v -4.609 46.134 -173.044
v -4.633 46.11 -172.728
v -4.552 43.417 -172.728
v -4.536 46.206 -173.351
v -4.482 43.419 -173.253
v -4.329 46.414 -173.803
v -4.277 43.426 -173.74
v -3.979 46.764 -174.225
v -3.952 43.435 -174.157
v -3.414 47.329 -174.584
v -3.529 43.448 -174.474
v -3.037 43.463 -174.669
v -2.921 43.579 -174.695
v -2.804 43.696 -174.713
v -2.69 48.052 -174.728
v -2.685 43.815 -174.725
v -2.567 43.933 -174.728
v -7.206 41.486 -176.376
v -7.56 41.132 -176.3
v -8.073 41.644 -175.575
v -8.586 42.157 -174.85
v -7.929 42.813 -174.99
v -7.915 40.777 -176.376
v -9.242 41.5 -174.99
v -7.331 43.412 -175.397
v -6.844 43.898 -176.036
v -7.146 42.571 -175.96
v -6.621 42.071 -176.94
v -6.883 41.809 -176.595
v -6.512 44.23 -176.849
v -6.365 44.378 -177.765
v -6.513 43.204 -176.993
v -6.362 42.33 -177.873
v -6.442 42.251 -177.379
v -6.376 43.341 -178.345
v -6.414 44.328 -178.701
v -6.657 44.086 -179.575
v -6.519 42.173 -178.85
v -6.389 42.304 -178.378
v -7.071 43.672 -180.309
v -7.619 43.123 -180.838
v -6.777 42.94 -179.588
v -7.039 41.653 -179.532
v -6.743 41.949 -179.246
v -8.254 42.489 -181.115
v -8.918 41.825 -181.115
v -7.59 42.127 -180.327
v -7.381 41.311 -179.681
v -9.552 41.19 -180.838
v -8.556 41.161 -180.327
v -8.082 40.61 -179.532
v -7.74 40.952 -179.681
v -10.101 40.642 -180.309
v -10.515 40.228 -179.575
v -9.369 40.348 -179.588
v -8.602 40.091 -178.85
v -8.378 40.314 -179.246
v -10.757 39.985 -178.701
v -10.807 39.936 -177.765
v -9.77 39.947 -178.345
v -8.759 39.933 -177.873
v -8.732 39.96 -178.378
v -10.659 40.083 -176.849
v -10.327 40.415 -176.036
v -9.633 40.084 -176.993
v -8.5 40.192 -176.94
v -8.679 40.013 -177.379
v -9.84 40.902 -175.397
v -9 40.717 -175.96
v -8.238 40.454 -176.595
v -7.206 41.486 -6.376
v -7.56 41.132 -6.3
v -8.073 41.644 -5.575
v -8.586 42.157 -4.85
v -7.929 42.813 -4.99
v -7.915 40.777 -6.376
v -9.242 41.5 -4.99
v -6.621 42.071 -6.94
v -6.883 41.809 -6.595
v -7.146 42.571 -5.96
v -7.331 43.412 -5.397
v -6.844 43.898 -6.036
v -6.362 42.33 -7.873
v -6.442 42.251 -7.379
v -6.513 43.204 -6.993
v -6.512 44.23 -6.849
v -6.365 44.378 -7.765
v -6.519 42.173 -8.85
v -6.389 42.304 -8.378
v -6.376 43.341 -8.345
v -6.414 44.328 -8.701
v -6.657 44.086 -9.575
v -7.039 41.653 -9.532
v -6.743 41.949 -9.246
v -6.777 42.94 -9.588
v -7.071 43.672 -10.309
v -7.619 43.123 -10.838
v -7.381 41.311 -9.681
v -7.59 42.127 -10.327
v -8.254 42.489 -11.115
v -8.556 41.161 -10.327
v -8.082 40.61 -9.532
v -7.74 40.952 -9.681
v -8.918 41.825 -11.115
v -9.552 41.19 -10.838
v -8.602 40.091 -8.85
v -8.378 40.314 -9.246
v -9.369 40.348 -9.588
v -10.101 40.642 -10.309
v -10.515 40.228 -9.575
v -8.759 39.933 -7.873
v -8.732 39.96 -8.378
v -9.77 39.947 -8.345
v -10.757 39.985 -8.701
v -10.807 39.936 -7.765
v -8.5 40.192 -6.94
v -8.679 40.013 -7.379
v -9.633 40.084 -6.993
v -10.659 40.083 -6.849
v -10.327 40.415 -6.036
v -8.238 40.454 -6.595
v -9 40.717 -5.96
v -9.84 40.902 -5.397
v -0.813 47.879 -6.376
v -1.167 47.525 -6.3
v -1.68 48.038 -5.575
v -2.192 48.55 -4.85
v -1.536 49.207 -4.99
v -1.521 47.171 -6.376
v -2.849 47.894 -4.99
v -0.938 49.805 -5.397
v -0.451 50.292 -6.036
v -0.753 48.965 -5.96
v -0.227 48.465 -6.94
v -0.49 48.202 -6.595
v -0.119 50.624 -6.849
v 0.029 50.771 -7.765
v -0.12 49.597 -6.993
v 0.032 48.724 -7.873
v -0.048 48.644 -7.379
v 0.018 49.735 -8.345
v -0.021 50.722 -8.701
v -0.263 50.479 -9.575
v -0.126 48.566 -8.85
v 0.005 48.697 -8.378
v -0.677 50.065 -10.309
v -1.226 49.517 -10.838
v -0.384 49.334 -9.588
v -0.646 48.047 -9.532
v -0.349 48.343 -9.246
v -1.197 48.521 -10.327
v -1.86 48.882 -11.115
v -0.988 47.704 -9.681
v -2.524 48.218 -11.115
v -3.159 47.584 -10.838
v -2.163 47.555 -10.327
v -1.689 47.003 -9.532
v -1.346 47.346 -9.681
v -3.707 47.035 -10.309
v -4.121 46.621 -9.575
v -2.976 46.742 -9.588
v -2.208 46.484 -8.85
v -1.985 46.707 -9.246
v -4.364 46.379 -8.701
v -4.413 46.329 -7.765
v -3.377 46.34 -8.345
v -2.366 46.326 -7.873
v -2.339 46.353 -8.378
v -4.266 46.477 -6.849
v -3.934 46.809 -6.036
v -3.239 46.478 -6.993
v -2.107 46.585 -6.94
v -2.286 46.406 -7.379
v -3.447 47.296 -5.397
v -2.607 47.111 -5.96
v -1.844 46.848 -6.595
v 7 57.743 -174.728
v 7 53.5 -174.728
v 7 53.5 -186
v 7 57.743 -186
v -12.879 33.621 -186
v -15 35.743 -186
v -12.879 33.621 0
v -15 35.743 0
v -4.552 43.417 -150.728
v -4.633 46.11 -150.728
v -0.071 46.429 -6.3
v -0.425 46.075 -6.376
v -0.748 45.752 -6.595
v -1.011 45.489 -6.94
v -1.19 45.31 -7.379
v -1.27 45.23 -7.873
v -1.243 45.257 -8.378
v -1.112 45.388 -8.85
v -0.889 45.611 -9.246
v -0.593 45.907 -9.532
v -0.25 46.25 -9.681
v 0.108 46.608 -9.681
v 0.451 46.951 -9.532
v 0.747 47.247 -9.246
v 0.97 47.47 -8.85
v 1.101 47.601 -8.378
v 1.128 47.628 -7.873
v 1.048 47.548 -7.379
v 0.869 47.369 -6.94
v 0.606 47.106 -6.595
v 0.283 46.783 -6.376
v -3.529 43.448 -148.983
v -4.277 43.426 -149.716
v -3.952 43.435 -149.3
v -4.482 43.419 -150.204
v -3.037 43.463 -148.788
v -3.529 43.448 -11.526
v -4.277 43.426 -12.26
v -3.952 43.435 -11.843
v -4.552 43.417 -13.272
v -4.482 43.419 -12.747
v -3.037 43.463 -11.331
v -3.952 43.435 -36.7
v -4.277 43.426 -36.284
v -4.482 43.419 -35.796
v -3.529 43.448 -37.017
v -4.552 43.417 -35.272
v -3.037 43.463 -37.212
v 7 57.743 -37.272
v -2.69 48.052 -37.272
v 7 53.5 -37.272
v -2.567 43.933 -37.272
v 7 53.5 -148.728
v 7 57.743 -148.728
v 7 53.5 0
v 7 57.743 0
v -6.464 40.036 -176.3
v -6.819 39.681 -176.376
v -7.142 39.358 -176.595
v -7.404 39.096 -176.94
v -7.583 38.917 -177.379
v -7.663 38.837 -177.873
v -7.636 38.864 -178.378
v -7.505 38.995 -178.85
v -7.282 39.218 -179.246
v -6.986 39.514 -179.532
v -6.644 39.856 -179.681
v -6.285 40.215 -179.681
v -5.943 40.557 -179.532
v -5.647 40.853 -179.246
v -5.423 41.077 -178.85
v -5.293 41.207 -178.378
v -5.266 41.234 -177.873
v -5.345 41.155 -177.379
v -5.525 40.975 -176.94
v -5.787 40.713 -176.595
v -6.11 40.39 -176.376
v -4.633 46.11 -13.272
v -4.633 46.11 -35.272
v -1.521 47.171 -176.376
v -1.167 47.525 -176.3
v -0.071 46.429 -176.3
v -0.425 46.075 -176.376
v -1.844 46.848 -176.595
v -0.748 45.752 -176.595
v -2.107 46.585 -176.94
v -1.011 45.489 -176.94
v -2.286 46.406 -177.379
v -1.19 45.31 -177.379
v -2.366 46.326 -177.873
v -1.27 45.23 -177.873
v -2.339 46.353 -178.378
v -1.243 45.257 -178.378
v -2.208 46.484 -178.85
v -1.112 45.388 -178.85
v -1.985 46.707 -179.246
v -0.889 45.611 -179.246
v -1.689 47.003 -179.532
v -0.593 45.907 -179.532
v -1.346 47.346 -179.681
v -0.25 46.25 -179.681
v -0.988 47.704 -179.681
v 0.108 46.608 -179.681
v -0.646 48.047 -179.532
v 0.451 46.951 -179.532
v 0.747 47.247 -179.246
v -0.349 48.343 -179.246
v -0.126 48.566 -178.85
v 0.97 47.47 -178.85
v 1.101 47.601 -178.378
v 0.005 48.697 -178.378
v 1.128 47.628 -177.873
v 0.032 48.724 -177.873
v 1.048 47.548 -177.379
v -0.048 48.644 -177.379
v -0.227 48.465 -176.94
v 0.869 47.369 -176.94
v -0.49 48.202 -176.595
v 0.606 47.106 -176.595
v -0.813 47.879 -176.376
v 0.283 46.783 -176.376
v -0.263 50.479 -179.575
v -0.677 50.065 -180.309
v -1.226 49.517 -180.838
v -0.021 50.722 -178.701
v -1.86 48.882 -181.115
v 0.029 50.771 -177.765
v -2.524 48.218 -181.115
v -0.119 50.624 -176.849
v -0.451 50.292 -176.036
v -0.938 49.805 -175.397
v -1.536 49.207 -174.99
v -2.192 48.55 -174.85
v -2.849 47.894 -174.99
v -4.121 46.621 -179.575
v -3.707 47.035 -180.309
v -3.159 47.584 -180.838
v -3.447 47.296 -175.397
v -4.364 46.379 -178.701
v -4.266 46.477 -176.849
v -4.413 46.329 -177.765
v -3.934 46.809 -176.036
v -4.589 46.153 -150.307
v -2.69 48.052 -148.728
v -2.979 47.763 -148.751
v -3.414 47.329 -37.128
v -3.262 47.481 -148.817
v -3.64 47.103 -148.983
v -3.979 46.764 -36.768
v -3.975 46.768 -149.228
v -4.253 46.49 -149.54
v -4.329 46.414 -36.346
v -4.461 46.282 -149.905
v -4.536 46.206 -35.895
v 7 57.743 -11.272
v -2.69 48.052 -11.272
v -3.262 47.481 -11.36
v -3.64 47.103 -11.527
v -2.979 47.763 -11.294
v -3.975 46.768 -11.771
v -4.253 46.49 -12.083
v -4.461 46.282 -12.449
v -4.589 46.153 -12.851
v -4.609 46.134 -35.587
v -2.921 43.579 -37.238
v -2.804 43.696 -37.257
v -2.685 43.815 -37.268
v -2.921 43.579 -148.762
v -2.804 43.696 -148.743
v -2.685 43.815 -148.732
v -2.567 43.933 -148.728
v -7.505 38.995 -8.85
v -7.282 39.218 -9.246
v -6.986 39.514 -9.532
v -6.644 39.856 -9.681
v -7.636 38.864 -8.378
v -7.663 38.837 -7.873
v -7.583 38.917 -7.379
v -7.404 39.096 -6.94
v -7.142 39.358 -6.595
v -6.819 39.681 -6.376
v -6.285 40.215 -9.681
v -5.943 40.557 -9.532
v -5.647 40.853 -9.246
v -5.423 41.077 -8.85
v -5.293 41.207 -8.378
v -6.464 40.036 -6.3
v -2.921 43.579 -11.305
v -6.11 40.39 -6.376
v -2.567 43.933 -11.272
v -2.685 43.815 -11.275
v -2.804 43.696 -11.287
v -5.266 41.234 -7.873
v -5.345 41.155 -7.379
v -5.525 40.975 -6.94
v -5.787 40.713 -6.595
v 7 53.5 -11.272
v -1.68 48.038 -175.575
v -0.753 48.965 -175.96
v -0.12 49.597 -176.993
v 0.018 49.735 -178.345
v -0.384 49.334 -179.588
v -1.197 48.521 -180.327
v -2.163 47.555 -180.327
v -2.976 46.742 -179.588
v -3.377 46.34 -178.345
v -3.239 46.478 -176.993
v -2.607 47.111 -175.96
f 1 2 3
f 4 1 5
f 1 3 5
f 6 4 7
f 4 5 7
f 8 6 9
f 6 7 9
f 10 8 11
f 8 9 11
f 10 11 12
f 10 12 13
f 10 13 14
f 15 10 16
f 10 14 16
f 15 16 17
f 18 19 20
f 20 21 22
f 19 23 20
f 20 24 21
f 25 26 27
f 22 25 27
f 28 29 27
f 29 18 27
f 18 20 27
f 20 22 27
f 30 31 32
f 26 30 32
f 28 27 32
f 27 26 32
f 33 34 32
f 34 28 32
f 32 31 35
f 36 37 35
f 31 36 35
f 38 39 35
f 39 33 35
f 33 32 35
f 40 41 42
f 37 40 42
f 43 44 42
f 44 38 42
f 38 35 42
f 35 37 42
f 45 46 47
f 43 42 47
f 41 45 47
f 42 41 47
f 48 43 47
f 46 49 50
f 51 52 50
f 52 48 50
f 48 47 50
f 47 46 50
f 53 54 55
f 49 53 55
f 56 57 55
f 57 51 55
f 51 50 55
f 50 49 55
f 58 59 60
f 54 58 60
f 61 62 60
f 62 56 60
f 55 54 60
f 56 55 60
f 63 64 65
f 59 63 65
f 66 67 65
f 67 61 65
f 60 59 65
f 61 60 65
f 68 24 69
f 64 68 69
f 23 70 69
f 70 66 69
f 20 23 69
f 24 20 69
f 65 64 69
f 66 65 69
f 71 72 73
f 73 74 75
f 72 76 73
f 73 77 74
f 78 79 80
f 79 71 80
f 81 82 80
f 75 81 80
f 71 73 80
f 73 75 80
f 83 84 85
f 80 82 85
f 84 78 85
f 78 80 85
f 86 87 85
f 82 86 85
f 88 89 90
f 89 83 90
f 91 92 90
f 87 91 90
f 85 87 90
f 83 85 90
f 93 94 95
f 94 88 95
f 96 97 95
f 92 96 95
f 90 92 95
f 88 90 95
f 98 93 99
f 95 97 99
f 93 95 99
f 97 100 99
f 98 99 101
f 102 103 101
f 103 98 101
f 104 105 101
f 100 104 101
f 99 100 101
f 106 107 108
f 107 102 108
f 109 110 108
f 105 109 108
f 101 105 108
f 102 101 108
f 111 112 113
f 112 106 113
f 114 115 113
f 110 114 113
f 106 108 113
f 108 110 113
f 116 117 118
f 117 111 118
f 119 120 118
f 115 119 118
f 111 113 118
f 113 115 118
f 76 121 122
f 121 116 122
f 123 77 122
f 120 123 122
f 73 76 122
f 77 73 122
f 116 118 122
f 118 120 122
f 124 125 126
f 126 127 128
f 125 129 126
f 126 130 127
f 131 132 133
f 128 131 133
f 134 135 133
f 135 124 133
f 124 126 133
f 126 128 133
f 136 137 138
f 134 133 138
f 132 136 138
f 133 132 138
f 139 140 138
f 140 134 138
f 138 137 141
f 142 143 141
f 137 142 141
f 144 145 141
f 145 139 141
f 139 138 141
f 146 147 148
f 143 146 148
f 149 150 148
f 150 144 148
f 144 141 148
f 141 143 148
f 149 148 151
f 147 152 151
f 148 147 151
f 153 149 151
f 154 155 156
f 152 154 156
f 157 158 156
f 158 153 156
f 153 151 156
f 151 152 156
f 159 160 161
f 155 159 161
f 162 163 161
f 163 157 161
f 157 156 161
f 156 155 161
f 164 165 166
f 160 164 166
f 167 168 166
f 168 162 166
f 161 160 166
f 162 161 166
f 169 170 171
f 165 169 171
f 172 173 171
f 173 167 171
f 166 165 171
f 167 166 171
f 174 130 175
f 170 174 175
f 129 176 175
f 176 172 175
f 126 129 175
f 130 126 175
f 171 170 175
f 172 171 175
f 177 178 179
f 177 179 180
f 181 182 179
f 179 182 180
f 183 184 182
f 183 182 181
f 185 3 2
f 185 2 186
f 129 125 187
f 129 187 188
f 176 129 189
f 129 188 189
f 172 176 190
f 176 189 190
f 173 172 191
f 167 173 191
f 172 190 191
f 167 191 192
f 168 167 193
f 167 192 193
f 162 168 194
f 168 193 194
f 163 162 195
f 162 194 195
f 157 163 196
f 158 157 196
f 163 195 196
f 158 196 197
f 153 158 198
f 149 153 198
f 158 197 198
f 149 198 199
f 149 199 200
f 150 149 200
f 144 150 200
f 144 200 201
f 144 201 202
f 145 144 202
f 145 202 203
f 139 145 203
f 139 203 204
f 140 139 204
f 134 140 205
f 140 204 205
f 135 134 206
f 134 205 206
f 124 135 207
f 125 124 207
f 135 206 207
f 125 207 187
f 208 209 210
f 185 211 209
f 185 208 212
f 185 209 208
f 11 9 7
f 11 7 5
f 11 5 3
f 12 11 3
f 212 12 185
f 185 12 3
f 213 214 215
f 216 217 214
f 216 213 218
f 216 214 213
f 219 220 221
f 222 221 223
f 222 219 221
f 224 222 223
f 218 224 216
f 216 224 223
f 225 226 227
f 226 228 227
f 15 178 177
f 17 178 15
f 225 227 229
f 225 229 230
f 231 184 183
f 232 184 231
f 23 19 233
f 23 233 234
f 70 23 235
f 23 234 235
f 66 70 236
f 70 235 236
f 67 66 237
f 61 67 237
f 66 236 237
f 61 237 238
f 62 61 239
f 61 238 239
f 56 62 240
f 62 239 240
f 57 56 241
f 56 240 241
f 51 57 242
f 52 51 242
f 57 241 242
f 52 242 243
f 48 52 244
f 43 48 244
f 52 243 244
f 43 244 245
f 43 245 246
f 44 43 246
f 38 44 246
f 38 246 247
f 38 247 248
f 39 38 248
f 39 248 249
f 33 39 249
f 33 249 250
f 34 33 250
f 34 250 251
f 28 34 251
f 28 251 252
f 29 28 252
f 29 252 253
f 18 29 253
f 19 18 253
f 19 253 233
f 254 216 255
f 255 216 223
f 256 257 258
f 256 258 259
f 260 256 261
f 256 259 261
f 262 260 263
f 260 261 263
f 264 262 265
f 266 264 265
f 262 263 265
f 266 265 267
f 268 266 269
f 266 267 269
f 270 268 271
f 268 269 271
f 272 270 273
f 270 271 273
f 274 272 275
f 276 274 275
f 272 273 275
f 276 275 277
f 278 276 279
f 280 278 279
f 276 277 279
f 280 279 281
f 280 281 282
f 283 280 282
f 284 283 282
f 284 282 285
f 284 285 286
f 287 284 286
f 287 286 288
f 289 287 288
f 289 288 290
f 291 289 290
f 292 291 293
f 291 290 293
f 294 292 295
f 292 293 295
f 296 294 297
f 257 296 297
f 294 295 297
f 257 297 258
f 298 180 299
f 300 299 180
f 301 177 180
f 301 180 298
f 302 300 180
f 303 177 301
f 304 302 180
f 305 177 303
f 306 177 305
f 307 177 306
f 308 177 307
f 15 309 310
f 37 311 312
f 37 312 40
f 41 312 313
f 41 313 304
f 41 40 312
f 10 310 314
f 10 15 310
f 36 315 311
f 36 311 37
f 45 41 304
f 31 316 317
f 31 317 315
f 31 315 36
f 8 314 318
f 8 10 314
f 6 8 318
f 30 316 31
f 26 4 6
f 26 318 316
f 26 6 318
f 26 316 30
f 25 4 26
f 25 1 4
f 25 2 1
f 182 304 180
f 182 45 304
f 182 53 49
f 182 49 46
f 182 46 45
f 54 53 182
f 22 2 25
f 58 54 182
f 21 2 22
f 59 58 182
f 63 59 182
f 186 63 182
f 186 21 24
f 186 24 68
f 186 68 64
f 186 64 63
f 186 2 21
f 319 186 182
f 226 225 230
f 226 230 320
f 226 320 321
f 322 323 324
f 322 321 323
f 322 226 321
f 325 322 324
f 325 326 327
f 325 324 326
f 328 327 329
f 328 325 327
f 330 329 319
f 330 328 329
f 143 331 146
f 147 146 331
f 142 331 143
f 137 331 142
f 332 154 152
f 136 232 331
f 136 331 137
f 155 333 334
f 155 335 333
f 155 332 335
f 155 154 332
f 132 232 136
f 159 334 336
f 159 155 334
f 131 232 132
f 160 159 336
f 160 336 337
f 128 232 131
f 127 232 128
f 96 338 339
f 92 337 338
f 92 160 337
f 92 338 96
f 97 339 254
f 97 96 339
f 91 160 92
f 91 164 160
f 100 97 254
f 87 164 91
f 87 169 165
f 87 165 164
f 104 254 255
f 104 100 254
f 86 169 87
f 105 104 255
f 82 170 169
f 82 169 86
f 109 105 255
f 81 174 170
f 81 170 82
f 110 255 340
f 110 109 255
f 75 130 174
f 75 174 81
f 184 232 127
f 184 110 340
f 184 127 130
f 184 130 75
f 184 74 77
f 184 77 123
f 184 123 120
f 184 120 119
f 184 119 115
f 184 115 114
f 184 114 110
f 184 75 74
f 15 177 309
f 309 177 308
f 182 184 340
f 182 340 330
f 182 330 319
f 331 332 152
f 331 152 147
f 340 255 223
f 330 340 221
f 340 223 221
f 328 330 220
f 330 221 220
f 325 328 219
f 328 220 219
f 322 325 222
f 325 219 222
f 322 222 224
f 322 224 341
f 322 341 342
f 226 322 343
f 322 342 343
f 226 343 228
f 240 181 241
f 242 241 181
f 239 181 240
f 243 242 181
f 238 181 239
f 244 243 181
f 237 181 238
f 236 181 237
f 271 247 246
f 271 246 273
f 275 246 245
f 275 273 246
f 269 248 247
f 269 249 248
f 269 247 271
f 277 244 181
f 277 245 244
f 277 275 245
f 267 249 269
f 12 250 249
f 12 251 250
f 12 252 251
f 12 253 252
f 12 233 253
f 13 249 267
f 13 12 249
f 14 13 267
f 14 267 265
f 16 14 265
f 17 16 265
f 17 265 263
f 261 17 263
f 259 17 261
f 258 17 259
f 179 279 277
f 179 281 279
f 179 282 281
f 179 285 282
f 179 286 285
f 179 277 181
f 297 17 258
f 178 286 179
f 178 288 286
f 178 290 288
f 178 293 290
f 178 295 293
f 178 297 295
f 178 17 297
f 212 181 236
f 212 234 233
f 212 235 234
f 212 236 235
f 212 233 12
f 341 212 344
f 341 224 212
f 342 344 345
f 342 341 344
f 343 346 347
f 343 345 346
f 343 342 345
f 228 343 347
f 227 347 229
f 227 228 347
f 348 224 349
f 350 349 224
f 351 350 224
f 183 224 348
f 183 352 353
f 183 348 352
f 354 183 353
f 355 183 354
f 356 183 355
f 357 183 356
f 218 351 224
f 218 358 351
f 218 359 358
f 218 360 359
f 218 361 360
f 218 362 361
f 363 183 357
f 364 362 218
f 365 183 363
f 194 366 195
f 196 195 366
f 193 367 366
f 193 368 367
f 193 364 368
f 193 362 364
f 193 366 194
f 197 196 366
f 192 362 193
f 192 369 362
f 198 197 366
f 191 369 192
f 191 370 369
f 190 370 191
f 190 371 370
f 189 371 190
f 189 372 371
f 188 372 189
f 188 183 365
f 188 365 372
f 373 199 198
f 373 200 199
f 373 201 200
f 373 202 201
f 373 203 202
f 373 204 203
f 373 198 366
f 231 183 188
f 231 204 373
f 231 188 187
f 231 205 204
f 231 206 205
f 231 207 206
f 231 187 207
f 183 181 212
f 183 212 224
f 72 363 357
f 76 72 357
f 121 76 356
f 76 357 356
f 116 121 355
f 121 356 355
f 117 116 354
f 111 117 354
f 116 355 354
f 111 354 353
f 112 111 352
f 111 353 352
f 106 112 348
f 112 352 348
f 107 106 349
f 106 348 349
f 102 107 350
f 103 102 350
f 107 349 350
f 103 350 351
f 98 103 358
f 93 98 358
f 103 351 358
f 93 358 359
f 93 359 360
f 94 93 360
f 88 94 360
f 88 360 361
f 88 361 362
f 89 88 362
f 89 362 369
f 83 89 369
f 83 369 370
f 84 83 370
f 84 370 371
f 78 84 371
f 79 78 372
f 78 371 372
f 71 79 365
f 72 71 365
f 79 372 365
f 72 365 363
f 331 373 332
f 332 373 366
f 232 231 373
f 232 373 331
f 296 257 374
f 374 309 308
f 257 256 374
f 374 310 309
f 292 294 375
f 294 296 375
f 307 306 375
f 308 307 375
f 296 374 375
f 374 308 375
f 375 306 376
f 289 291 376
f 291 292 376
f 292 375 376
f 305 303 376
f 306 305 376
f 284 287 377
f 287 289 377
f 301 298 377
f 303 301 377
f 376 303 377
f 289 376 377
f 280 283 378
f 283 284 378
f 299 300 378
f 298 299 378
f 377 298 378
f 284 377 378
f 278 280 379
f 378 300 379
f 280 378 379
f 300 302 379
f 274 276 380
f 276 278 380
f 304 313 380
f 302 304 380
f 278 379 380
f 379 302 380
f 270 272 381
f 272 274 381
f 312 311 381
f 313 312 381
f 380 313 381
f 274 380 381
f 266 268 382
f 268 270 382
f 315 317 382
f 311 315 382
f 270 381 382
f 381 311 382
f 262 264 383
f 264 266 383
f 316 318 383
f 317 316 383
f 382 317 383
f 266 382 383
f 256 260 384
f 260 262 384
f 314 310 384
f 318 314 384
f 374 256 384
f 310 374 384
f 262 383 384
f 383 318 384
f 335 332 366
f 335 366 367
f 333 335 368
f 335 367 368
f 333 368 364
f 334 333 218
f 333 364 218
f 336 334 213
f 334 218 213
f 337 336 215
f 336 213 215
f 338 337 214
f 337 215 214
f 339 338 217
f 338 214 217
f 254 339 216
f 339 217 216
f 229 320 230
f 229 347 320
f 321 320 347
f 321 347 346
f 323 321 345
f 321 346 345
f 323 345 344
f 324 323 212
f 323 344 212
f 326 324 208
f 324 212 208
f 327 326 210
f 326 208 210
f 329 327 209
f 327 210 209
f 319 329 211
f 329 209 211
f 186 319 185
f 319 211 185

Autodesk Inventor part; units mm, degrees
ref_plane "YZ Plane" through (0, 0, 0) normal (1, 0, 0) x (0, 1, 0)
ref_plane "XZ Plane" through (0, 0, 0) normal (0, 1, 0) x (-1, 0, 0)
sketch "Sketch1" plane through (0, 0, 0) normal (0, 0, 1) x (1, 0, 0)
  line L0 (7.0071, 53.5071) -> (-15, 31.5) construction
  line L1 (7, 58.5) -> (7, 55.5) construction
  line L2 (7, 57.7426) -> (-15, 35.7426)
  line L3 (-15, 35.7426) -> (-12.8787, 33.6213)
  line L4 (-12.8787, 33.6213) -> (7, 53.5)
  line L5 (7, 53.5) -> (7, 57.7426)
  line L6 (15, 58.5) -> (15, 66.5) construction
  point P0 (0, 0)
  point P1 (15, 62.5)
  dimension "d0" = 30
  dimension "d1" = 3
ref_plane "Work Plane1" through (-15, -58.5, -186) normal (0, 0, -1) x (0, 1, 0)
extrude "Extrusion1" add sketch "Sketch1" against normal up to surface (186 mm away)
ref_plane "Work Plane2" through (1.4452, 43.5974, -13.2717) normal (-0.03, 0.9995, 0) x (0.9995, 0.03, 0)
sketch "Sketch2" plane through (1.4452, 43.5974, -13.2717) normal (-0.03, 0.9995, 0) x (0.9995, 0.03, 0)
  line L0 (-4, 22) -> (-4, 0) construction
  line L1 (4, 22) -> (-4, 22) construction
  line L2 (-4, 0) -> (4, 0) construction
  line L3 (-6, 0) -> (-6, 22)
  line L4 (-4, 24) -> (5.9769, 24)
  line L5 (5.9769, 24) -> (5.9769, -2)
  line L6 (5.9769, -2) -> (-4, -2)
  line L7 (5.9769, 172.7283) -> (-16.6735, 172.7283) construction
  line L8 (-16.6735, -13.2717) -> (-16.6735, 172.7283) construction
  line L9 (5.9769, -13.2717) -> (-16.6735, -13.2717) construction
  line L10 (5.9769, -13.2717) -> (5.9769, 172.7283) construction
  arc A0 (-6, 0) -> (-4, -2) centre (-4, 0) ccw
  arc A1 (-4, 24) -> (-6, 22) centre (-4, 22) ccw
  line L11 (5.9769, 79.7283) -> (-16.6735, 79.7283)
  line L12 (-6, 159.4566) -> (-6, 137.4566)
  line L13 (-4, 135.4566) -> (5.9769, 135.4566)
  line L14 (5.9769, 135.4566) -> (5.9769, 161.4566)
  line L15 (5.9769, 161.4566) -> (-4, 161.4566)
  arc A2 (-4, 161.4566) -> (-6, 159.4566) centre (-4, 159.4566) ccw
  arc A3 (-6, 137.4566) -> (-4, 135.4566) centre (-4, 137.4566) ccw
  point P0 (-2.7531, -13.2717)
  dimension "d4" = 2
  dimension "d5" = 2
  dimension "d6" = 2
  dimension "d7" = 2
  dimension "d8" = 2
extrude "Extrusion2" cut sketch "Sketch2" along normal through all
sketch "Sketch3" plane through (-15, 35.7426, -186) normal (-0.7071, 0.7071, 0) x (-0.7071, -0.7071, 0)
  circle A0 centre (-9.0711, 178) radius 2.25 projected
  circle A1 centre (-18.1127, 178) radius 2.25 projected
  circle A2 centre (-9.0711, 8) radius 2.25 projected
  circle A3 centre (-18.1127, 8) radius 2.25 projected
  point P0 (14.6673, 186)
hole "Hole1" at (-8.5858, 42.1569, -8) at (-2.1924, 48.5503, -8) at (-8.5858, 42.1569, -178) at (-2.1924, 48.5503, -178) direction (0.7071, -0.7071, 0) diameter 3.4 end through all countersink diameter 6.3 countersink angle 90 clearance for "Countersunk Flat Head Screw ISO 2009/7046" size "M3" standard "ISO"
equation "\"d5\" = d4"
equation "\"d6\" = d4"
properties part number "Przod"
